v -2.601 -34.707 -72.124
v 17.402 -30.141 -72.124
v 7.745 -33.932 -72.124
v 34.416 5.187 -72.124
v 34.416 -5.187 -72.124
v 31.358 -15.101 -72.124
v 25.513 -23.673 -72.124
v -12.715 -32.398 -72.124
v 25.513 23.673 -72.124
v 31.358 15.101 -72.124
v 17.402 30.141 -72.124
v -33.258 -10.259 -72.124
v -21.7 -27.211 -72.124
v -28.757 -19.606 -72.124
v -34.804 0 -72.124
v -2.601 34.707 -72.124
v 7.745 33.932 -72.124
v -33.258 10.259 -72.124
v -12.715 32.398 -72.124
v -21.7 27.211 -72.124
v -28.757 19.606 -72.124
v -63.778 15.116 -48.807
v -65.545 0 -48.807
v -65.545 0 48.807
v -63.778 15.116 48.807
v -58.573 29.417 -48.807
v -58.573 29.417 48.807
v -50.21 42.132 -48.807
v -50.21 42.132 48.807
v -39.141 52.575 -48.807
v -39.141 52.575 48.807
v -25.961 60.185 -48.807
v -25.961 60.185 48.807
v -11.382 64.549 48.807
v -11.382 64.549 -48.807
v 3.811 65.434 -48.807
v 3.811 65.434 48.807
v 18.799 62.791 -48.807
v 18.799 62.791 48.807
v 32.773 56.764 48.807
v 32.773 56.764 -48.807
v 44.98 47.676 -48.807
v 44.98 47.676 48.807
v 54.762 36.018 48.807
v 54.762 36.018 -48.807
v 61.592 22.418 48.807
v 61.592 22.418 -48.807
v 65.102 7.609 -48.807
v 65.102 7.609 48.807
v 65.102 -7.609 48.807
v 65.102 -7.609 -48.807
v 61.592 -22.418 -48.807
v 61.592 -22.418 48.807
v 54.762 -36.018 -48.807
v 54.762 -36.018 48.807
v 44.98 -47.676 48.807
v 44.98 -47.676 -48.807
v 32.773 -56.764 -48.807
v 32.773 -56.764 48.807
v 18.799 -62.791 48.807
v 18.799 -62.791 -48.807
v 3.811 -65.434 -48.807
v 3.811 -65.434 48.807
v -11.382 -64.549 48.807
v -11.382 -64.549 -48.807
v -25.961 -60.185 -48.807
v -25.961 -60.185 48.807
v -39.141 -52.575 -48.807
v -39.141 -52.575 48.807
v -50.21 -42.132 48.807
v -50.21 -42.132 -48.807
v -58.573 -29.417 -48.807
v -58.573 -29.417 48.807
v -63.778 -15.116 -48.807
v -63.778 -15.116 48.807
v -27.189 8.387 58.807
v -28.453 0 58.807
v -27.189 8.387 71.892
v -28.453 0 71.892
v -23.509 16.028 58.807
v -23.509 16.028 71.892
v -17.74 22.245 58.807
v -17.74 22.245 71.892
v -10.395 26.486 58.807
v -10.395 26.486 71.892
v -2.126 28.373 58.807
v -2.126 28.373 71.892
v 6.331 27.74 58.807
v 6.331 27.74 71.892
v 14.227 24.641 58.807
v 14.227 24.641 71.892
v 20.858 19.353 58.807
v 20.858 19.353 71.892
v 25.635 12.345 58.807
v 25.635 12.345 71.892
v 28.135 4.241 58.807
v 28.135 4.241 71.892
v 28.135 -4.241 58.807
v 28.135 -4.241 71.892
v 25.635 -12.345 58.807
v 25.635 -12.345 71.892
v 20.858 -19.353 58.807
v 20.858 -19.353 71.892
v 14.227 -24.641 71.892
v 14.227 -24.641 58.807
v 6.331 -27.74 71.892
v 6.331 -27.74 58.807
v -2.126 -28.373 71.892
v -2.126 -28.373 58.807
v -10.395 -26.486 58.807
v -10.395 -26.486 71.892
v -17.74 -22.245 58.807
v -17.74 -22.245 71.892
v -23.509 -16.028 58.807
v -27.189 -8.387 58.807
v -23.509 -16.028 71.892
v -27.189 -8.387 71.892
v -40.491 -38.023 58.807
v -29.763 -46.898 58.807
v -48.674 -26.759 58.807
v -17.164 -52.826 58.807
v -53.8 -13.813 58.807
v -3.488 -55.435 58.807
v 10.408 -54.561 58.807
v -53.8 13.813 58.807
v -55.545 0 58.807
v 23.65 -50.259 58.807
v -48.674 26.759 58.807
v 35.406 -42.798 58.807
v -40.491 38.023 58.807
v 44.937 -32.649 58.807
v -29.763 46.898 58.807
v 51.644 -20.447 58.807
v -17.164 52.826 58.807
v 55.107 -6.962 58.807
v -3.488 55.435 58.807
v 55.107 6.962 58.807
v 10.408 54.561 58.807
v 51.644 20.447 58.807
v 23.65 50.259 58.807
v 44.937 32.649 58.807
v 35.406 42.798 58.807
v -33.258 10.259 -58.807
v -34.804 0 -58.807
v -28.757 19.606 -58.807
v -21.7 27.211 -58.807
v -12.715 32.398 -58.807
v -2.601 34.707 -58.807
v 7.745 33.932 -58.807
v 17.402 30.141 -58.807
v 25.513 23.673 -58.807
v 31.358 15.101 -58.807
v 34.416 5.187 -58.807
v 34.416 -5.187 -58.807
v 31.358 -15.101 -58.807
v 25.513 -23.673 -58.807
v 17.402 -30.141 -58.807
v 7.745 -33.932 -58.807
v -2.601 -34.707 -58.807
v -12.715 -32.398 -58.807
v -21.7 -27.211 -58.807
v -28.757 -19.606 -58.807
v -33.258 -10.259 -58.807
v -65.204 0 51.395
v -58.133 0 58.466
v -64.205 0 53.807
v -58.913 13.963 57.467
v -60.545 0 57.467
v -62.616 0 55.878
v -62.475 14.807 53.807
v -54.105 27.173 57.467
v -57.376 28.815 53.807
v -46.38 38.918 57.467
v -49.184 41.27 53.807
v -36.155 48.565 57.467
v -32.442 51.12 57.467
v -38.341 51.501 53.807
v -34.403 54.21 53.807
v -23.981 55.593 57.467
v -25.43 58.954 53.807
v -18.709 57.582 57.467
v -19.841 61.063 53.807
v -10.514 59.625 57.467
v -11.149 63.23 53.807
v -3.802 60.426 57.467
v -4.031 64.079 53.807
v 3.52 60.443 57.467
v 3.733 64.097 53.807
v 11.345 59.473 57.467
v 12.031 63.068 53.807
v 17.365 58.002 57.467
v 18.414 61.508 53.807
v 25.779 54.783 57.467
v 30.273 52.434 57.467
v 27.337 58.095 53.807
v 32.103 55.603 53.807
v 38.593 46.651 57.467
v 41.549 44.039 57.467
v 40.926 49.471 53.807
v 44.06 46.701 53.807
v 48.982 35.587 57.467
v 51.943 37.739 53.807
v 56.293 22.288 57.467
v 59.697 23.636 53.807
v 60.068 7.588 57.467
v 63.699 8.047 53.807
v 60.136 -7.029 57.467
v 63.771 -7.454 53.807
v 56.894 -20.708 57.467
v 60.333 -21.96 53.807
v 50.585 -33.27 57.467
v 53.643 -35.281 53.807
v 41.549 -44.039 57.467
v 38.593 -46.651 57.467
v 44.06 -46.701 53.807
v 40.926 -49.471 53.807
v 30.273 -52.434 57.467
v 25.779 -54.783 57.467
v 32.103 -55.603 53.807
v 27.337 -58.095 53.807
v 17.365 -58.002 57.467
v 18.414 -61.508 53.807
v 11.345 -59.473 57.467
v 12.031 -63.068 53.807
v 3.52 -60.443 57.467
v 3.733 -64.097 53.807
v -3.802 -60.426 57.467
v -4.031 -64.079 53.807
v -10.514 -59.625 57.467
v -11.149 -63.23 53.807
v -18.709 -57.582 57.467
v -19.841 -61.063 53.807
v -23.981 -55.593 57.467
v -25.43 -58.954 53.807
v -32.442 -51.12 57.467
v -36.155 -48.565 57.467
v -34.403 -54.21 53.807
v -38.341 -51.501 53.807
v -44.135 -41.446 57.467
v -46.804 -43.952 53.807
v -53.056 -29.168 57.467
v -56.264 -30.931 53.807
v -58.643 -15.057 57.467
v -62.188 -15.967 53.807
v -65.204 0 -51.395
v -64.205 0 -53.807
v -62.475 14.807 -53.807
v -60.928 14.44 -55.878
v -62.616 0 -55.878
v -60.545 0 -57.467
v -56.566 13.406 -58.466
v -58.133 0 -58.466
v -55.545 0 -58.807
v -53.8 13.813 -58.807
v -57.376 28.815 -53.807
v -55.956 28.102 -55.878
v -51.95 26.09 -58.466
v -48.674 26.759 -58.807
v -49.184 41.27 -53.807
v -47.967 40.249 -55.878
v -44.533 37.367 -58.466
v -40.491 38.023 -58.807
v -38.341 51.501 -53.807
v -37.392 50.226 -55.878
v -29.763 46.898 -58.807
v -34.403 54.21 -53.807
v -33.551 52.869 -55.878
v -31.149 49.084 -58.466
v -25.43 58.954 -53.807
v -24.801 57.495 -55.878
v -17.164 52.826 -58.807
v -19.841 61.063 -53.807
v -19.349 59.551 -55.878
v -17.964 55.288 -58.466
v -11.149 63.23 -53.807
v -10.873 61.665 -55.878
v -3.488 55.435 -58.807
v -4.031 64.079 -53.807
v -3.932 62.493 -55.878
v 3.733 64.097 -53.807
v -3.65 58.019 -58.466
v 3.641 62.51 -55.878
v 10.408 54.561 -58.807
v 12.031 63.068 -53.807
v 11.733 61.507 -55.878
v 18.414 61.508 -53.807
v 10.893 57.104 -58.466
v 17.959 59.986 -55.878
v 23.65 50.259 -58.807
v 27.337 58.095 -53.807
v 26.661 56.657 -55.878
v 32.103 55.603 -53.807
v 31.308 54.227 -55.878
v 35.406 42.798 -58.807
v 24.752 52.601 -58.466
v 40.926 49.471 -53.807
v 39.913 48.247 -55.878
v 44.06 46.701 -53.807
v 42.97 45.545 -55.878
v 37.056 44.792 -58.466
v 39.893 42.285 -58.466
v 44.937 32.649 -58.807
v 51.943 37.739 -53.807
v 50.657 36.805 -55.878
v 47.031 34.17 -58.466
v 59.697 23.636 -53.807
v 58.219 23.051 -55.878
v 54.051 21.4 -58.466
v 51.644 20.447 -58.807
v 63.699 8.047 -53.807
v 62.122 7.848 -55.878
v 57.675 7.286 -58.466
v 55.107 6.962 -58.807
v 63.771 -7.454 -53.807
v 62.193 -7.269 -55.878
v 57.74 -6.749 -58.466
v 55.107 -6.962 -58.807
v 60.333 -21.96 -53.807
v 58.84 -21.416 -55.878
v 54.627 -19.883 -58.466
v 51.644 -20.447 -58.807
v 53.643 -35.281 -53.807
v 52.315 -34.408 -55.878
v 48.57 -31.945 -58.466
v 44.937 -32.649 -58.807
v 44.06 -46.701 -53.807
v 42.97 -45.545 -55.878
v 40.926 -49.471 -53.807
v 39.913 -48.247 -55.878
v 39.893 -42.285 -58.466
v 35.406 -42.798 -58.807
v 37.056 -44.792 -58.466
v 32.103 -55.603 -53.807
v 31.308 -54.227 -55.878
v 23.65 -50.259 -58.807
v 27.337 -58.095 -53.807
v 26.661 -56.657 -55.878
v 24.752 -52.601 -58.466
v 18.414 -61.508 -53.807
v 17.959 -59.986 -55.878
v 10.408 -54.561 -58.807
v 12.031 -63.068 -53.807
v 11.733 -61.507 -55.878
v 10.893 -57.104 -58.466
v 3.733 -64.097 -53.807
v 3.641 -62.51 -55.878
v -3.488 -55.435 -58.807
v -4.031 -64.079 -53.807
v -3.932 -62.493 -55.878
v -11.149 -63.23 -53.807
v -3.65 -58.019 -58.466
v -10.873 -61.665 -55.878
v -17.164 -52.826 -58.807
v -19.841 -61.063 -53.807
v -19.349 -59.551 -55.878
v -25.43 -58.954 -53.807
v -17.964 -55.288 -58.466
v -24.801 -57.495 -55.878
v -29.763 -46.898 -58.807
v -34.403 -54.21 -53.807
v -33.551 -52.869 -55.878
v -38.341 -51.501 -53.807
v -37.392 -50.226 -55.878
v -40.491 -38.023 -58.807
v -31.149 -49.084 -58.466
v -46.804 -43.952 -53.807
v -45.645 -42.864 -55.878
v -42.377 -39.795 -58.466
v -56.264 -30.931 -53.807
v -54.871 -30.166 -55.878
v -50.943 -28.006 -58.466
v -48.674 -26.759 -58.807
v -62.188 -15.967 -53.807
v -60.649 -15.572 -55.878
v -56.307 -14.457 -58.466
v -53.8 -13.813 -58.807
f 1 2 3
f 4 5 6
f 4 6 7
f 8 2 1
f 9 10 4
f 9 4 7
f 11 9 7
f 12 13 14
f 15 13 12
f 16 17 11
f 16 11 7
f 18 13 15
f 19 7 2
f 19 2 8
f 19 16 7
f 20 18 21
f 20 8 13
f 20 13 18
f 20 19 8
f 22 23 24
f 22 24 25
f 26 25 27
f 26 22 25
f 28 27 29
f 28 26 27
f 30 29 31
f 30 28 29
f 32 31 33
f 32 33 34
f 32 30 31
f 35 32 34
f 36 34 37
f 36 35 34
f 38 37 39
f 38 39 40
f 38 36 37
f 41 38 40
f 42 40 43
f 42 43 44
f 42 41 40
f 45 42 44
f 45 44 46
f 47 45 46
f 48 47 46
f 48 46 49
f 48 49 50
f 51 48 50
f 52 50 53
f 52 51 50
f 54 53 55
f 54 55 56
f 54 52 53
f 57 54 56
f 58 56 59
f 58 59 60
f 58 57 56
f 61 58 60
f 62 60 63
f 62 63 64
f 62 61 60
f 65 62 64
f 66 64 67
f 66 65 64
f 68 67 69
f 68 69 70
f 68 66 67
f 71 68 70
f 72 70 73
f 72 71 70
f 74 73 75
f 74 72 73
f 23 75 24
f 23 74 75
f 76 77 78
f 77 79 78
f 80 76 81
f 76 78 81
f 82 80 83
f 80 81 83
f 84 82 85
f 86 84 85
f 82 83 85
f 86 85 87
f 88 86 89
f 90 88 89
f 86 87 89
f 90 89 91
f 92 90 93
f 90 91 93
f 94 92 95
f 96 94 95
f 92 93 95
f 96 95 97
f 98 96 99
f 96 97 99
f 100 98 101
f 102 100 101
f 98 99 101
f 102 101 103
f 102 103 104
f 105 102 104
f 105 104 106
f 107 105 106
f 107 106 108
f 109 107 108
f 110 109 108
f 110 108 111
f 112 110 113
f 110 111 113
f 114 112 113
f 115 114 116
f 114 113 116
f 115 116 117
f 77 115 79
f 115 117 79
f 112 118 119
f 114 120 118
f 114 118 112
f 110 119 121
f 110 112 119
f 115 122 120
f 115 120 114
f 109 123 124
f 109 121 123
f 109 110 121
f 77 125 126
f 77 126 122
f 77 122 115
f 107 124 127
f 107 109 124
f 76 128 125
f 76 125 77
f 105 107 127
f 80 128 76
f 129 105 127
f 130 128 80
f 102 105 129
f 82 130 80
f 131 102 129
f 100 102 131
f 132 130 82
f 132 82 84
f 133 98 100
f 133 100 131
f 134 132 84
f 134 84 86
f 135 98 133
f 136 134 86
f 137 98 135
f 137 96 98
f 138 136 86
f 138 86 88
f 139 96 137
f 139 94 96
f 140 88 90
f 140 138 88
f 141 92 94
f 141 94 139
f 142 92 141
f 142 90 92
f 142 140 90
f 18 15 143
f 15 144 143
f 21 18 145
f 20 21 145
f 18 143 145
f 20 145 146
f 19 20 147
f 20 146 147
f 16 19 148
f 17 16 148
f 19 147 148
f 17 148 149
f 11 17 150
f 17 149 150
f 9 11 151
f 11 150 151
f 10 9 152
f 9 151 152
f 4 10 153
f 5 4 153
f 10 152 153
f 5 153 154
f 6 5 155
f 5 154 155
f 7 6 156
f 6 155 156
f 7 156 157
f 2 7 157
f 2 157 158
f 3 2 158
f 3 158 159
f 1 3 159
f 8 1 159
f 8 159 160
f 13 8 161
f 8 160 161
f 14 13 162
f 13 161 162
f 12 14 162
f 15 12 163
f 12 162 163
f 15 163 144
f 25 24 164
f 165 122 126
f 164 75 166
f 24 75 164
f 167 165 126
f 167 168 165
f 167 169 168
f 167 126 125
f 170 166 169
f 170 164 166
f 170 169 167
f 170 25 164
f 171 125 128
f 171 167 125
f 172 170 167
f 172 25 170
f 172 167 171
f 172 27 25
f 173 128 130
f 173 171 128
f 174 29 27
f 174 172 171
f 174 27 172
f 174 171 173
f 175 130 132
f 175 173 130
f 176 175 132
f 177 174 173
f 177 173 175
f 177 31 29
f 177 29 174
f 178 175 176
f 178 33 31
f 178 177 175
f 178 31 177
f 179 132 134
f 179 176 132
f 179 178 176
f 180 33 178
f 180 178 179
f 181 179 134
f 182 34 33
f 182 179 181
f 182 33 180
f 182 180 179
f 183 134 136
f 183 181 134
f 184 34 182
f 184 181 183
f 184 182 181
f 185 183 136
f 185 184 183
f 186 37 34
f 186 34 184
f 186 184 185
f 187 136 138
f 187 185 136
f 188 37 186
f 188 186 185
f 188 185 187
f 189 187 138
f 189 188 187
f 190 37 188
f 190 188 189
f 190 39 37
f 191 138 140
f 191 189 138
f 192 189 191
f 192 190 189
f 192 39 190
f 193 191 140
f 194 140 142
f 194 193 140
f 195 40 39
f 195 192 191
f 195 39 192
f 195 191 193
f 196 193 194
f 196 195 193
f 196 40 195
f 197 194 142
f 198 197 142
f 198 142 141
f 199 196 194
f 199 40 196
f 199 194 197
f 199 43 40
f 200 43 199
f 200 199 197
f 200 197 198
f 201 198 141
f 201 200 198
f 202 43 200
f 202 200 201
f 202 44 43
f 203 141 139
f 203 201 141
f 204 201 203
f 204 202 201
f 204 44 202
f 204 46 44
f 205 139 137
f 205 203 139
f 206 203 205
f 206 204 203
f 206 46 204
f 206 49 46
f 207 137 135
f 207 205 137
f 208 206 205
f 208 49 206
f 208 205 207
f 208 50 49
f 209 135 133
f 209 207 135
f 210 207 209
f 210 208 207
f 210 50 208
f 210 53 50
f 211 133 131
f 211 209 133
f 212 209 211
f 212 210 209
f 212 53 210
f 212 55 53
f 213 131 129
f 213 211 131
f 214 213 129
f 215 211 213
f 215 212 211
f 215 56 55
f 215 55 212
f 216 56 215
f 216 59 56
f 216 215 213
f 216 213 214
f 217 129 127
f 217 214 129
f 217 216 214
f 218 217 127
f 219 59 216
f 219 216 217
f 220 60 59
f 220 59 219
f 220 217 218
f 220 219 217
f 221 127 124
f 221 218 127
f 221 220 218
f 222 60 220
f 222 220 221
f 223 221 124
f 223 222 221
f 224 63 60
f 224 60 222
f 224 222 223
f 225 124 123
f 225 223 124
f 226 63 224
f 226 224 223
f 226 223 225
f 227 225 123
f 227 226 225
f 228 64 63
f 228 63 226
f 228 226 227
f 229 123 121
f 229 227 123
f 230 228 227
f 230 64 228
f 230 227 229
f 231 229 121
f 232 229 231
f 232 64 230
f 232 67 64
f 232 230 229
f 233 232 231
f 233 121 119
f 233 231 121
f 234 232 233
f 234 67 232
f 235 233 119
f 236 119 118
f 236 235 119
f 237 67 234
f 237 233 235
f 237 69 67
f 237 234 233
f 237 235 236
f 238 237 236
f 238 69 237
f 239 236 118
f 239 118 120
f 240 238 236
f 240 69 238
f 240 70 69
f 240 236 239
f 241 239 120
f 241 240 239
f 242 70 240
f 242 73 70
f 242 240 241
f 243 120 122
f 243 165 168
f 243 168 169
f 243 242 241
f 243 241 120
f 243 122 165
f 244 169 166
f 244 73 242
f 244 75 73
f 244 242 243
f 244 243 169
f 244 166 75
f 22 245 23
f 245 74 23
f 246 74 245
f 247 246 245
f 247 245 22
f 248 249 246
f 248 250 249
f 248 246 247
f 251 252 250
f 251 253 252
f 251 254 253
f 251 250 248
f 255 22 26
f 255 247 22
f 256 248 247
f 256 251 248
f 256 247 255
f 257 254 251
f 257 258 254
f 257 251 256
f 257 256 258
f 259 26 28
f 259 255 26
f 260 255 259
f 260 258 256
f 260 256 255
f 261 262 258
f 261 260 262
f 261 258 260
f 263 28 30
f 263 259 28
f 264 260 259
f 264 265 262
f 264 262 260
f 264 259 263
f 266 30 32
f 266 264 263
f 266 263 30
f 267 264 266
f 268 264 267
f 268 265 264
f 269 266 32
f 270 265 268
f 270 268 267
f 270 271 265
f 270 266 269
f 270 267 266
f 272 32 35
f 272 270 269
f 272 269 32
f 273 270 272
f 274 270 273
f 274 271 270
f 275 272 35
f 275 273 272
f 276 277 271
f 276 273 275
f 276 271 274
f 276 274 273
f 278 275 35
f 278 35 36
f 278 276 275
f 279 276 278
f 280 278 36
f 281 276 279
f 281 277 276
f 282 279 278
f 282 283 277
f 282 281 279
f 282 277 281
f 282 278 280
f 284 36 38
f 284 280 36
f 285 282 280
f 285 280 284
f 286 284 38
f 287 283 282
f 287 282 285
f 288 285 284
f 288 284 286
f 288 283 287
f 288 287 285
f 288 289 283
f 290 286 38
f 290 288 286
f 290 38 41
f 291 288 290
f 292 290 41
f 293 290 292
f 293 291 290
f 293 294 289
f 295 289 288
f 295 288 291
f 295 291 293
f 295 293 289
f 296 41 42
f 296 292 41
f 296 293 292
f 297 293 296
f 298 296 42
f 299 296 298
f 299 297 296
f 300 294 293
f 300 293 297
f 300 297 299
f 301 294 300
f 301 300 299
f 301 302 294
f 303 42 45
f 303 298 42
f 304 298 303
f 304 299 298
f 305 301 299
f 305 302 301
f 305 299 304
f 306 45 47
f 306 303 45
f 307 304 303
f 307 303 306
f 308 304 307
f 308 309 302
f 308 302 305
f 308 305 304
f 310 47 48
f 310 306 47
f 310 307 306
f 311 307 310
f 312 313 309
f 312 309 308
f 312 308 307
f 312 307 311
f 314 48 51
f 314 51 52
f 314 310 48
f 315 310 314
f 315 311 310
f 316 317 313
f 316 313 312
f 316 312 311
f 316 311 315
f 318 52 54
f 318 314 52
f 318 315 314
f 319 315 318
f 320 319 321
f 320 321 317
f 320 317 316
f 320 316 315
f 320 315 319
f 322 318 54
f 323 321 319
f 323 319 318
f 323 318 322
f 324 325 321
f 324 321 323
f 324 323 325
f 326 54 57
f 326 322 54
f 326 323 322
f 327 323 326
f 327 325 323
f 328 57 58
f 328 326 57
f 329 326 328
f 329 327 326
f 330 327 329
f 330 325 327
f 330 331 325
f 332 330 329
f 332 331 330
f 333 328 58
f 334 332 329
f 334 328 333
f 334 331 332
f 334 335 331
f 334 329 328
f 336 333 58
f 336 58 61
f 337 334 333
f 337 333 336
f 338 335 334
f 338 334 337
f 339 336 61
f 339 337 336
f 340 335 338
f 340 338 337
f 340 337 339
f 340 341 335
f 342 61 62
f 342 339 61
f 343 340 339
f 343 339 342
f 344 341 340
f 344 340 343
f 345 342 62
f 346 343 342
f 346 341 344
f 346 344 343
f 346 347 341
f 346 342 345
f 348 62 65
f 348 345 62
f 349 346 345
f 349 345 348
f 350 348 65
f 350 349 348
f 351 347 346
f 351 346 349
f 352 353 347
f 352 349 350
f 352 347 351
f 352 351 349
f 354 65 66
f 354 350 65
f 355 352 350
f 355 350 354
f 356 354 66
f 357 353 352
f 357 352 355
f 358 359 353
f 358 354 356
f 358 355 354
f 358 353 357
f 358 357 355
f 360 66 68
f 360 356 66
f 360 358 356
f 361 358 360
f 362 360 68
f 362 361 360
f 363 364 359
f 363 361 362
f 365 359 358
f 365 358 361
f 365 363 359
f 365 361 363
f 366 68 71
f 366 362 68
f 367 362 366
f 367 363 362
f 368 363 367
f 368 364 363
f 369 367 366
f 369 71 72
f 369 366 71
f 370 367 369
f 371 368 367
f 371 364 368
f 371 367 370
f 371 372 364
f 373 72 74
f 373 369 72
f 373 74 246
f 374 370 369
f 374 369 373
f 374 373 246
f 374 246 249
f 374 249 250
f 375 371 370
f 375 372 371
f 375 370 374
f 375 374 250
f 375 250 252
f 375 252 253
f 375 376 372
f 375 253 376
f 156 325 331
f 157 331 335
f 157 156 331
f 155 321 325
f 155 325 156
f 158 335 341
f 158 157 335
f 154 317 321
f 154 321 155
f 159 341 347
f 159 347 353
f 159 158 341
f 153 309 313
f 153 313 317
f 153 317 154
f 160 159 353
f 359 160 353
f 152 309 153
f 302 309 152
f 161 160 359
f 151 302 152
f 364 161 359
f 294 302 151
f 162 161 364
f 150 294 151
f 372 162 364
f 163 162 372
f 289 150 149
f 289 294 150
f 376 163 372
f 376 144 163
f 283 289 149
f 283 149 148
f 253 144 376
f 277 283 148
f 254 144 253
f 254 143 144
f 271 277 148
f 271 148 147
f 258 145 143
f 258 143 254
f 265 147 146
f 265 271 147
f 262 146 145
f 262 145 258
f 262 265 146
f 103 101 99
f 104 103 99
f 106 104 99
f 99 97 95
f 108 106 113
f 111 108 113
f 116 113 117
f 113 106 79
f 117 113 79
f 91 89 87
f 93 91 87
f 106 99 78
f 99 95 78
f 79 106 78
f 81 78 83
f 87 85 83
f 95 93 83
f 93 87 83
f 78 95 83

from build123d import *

# Parameters (mm, degrees)
F0_W   = 28.4530296922
F0_H   = 13.0855888128
F0_W_2 = 34.8043181002
F0_H_2 = 13.3176594973
F2_R   = 10


with BuildPart() as f1:
    # F0 (on Front) → F1 (revolve)
    with BuildSketch(Plane.XZ):
        with Locations((-14.2265148461, 65.3495416045)):
            Rectangle(F0_W, F0_H)
        Polygon((0, -58.8067471981), (0, 58.8067471981), (-28.4530296922, 58.8067471981), (-65.5450373888, 58.8067471981), (-65.5450373888, -58.8067471981), (-34.8043181002, -58.8067471981), align=None)
        with Locations((-17.4021590501, -65.4655769467)):
            Rectangle(F0_W_2, F0_H_2)
    revolve(axis=Axis((0, 0, 0), (0, 0, -1)))

    # F2
    f2_edges = [f1.edges().sort_by_distance(p)[0] for p in [
        (65.545037, 0, 58.806747),
        (65.545037, 0, -58.806747),
        (-65.545037, 0, 0),
    ]]
    fillet(f2_edges, radius=F2_R)


solid = f1.part
